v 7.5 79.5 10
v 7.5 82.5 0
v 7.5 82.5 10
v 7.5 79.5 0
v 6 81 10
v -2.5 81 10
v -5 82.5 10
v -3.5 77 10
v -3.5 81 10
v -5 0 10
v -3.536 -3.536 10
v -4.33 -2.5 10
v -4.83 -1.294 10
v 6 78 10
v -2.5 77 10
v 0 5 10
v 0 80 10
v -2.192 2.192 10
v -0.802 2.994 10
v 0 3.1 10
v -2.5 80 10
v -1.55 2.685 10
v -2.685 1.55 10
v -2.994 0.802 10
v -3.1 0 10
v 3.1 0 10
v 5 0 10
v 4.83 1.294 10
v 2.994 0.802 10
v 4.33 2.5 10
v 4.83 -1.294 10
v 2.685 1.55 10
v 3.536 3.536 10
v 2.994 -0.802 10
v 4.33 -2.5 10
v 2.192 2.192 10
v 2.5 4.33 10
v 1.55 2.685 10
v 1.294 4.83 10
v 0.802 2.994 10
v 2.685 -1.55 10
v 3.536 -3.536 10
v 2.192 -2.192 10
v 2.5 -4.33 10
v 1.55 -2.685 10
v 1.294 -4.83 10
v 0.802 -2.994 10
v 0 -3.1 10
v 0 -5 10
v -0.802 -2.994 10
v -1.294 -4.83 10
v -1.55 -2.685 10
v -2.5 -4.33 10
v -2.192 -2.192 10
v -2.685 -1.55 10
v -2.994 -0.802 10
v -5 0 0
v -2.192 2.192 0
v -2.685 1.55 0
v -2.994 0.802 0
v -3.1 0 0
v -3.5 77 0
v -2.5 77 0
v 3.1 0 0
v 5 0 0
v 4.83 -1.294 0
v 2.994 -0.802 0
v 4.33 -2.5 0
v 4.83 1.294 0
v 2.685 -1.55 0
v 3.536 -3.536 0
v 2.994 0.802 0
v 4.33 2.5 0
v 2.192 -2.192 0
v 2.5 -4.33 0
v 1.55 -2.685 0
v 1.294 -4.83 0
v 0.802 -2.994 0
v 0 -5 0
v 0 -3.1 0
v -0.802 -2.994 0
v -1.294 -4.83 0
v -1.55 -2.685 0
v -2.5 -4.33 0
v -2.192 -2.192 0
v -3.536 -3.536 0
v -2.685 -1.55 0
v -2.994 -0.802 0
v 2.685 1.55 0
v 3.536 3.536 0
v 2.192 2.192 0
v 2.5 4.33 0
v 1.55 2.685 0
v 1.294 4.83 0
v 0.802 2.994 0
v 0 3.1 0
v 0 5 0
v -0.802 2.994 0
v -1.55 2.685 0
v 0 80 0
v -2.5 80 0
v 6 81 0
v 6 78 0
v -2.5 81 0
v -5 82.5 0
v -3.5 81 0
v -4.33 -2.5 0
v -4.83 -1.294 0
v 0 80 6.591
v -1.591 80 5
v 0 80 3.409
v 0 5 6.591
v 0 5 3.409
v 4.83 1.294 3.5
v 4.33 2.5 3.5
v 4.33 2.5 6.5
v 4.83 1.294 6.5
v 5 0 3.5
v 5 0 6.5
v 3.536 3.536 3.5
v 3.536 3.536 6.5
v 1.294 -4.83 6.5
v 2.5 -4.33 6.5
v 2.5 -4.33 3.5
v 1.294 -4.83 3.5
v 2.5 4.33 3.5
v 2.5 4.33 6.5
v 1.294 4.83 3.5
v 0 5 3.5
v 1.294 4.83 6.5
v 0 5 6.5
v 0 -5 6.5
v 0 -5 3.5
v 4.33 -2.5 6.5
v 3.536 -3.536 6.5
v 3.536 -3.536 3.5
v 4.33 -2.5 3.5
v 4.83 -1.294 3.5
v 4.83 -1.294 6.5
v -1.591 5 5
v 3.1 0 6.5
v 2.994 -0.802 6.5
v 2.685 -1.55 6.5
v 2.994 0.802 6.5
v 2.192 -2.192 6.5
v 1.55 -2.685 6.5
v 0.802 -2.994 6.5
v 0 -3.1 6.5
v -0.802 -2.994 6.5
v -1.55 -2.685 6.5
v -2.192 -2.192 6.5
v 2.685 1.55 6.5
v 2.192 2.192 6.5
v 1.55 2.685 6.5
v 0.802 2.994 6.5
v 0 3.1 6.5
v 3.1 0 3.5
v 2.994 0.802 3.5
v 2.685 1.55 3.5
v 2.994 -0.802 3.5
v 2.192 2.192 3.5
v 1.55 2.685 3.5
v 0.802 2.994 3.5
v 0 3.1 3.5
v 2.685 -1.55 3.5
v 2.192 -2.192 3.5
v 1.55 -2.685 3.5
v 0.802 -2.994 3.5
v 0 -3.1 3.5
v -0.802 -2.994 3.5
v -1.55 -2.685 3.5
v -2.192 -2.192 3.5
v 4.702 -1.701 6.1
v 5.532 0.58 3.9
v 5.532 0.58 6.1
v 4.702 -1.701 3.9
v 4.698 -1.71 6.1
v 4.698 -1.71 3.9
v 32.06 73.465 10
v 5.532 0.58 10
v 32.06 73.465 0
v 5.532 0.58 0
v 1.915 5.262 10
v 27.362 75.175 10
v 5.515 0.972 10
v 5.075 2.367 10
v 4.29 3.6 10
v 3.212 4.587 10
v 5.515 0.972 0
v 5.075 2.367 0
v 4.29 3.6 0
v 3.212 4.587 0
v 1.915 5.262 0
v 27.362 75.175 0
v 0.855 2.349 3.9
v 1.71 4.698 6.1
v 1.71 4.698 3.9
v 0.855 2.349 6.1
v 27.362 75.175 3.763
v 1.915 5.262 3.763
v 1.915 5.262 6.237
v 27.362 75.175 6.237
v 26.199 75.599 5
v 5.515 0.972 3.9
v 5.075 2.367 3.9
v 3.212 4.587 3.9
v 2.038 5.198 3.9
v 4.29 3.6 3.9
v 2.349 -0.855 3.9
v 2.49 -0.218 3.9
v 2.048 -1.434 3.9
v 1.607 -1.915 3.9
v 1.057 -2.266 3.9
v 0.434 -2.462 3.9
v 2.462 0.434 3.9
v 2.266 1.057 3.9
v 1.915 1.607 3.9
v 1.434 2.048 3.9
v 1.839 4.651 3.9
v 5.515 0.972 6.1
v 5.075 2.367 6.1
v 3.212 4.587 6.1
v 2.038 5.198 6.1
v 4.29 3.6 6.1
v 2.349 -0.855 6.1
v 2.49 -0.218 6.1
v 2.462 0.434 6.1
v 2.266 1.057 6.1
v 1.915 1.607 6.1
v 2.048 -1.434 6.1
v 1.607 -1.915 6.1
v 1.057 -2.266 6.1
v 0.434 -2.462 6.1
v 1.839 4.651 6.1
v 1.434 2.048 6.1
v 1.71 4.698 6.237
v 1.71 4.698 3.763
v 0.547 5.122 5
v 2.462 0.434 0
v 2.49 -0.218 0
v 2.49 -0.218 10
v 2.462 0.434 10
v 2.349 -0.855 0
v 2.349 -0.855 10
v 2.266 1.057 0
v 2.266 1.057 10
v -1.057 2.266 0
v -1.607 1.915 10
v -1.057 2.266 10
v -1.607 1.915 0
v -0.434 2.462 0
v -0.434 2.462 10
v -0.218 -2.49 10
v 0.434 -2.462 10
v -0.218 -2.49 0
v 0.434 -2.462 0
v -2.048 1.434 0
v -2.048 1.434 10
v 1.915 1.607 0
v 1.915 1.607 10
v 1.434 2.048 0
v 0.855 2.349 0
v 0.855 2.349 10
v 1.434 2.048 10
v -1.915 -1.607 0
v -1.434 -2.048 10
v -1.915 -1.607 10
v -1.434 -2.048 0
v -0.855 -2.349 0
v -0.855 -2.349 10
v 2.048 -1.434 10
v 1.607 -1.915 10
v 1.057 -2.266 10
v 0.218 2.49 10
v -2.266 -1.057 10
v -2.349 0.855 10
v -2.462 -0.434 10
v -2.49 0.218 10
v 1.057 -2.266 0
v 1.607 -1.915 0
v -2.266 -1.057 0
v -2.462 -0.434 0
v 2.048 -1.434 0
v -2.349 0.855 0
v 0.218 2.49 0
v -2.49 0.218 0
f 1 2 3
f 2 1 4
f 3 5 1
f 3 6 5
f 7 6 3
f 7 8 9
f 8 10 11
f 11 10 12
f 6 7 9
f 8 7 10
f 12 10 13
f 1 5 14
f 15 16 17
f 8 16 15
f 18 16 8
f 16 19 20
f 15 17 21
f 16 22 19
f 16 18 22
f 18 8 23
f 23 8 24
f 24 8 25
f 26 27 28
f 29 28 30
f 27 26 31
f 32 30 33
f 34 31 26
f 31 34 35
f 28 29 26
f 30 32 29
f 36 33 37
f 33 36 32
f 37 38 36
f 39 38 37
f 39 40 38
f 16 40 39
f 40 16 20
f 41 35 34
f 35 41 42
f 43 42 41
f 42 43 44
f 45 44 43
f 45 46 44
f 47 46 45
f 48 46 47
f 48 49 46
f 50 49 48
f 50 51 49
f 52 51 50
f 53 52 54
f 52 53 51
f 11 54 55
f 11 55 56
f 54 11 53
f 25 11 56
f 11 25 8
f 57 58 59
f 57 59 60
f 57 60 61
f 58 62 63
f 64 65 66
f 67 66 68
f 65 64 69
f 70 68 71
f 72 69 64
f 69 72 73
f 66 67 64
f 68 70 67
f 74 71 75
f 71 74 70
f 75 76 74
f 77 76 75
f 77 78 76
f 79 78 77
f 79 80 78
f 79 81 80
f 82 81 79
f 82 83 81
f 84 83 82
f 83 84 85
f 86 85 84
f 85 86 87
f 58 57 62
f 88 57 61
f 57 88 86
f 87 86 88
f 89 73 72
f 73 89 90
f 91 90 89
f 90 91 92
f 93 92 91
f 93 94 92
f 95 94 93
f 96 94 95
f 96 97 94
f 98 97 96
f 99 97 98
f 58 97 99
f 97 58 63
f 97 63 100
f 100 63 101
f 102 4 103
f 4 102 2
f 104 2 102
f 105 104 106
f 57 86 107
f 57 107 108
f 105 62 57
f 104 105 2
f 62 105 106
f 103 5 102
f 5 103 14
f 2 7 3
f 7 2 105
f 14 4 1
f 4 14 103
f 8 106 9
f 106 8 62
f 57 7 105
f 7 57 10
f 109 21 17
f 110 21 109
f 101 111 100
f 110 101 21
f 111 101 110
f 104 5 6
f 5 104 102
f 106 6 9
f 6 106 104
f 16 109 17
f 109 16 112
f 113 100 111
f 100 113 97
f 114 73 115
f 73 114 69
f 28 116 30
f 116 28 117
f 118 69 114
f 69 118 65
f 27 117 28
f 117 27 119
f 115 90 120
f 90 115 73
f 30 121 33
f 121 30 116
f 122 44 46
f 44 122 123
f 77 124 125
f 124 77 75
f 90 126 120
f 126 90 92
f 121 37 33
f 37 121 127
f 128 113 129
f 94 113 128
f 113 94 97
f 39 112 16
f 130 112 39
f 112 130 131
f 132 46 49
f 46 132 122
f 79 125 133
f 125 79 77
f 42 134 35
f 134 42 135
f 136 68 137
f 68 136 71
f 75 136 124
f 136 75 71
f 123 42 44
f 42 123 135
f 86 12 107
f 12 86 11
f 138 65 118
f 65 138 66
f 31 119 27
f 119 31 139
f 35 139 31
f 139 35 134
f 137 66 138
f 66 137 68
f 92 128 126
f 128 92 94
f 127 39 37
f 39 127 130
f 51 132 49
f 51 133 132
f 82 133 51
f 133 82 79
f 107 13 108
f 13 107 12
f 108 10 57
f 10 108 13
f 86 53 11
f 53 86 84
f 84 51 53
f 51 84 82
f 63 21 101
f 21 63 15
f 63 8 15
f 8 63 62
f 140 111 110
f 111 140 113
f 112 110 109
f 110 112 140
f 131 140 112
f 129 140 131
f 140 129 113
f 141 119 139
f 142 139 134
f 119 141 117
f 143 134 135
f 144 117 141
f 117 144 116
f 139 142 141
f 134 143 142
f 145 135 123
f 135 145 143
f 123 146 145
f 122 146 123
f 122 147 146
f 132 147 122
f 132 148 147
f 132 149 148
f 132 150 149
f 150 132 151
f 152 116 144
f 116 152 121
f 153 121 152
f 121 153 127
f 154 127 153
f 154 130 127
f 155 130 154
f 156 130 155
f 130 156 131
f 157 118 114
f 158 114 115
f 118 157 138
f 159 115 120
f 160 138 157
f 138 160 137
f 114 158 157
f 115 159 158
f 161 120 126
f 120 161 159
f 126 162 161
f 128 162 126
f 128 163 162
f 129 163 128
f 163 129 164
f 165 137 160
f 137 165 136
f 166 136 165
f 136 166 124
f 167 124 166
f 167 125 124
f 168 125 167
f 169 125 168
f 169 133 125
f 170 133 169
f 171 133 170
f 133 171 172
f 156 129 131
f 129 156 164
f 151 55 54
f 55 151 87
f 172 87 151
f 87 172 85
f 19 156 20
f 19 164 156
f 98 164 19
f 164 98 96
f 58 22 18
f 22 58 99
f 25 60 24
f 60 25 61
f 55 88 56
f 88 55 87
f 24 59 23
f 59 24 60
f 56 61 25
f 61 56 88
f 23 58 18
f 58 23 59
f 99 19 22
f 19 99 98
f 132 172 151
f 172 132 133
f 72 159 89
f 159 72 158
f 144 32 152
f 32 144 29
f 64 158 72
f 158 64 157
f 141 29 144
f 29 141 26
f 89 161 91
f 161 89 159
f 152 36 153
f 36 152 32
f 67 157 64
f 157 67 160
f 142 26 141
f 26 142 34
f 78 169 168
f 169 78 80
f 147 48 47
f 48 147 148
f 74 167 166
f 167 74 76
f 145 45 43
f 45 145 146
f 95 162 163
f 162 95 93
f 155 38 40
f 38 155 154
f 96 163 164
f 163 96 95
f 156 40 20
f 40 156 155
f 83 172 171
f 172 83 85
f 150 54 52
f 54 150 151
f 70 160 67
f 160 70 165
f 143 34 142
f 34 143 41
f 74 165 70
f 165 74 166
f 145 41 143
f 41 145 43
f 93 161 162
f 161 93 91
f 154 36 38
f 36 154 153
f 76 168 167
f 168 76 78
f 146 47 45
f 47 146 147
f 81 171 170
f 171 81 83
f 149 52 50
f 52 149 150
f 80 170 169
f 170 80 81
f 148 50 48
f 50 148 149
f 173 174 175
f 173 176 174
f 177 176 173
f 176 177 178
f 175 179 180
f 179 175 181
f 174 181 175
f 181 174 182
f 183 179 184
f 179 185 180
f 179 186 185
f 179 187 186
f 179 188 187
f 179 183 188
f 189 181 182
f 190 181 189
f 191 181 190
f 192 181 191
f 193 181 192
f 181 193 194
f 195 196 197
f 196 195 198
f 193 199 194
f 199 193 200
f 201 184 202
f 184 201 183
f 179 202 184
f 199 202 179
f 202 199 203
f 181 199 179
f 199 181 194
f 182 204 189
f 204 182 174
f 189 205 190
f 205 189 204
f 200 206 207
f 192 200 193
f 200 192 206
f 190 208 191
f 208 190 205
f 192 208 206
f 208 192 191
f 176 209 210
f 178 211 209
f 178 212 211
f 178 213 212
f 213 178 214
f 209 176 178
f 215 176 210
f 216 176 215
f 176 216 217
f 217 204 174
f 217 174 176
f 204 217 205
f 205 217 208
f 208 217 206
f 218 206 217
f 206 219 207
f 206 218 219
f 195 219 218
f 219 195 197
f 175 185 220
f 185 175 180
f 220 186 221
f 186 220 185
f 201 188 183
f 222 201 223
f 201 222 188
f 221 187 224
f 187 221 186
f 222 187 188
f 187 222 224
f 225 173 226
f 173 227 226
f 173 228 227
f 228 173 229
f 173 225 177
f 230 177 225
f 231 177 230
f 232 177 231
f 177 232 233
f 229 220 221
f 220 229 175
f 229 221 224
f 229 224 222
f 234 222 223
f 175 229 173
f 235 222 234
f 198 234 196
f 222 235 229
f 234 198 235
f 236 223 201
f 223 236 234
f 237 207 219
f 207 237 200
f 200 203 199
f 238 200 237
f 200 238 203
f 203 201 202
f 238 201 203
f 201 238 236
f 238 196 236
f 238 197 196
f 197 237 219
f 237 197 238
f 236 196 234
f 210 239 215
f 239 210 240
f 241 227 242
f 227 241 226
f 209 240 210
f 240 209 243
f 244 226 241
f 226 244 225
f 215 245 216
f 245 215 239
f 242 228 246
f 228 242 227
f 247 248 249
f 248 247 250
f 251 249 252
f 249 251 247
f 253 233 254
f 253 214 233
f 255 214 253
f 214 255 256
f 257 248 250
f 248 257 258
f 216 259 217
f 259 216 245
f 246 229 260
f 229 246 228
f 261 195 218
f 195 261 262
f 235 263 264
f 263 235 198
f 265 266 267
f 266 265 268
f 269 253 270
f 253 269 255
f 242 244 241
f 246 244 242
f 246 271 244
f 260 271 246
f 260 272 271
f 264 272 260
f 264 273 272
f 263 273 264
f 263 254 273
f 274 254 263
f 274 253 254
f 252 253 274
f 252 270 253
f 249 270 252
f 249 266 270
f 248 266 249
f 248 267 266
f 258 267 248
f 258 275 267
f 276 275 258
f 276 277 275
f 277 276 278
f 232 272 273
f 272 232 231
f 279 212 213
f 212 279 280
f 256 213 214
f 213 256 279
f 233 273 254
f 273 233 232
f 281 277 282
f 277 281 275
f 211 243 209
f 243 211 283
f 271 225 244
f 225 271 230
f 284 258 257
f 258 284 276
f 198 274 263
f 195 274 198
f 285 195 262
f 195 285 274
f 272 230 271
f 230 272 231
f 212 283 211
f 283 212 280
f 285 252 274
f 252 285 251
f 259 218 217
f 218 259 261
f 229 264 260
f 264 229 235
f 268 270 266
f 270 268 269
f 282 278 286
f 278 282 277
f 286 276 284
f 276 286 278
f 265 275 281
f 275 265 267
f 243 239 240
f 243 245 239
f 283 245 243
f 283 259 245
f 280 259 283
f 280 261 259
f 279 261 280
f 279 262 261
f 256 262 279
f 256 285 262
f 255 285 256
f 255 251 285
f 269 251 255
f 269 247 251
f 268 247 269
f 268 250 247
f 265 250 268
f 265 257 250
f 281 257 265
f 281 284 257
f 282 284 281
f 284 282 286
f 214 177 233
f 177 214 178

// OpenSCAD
/* https://www.thingiverse.com/thing:2165264 */

// The diameter of the hinge
axis_diameter = 5.0;
// The gap left around the hinge (subtracted from the diameter)
axis_margin = 0.6;
// Z-wise separation near parts
axis_margin_z = 0.4;

// The length of the arms (from hinge center)
arm_length = 80.0;
// The height of the arms
arm_height = 10.0;
// The width/thickness of one arm
arm_width  =  5.0;

// The size of the hinge attached to the second arm
mount_height = 3.0;

// Size of the channel/potrusion in the arms, 0 to disable
channel_d = 2;

// Length of the locking hook
hook_tooth_length = 4.5;

/* [Hidden] */

hook_margin = 1.0;
hook_thickness = 1.5;
hook_trim_length = 3.0;

_cyl_fn = 24;

base_arm();
color("red") rotate(-20) second_arm();

module base_arm() {
    difference() {
        union() {
            // Main arm
            translate([-arm_width, 0])
                    cube([arm_width, arm_length, arm_height]);
            // Hinge outer
            cylinder(r=arm_width, h=arm_height, $fn=_cyl_fn);
            
            // Hook
            translate([-arm_width, arm_length, 0]) {
                cube([hook_thickness, hook_thickness+hook_margin, arm_height]);
                translate([0, hook_margin, 0])
                    cube([arm_width*2+hook_margin, hook_thickness, arm_height]);
                translate([arm_width*2+hook_margin, -hook_tooth_length+hook_margin+hook_thickness, 0])
                    difference() {
                        cube([hook_thickness, hook_tooth_length, arm_height]);
                        translate([0,0,-1]) rotate(-45)
                            cube([hook_thickness*1.5, hook_thickness*1.5, arm_height+2]);
                    }
            }
        }
        // Hook trim
        translate([-arm_width+hook_thickness, arm_length-hook_trim_length, -1])
            cube([hook_margin, hook_trim_length+hook_margin, arm_height+2]);
        
        channel(0.25);
        
        // Remove slot for arm to rotate in
        translate([0,-arm_width, (arm_height-mount_height)/2])
            cube([arm_width, arm_width*2, mount_height]);
        
        c_h = (arm_height - mount_height) / 2;
        // Trim slot a bit more
        translate([0, 0, c_h])  hull() {
            cylinder(d=axis_diameter+axis_margin*2, h=mount_height, $fn=_cyl_fn);
            translate([0, -arm_width, 0]) cube([0.01, arm_width, mount_height]);
        }
        
        // Big center hole
        translate([0,0,-1]) cylinder(d=axis_diameter+axis_margin*2, h=arm_height+2, $fn=_cyl_fn);
    }
}


module channel(delta=0) {
    if (channel_d > 0) {
        translate([0,arm_length/2+axis_diameter/2, arm_height/2]) rotate([0, 45, 0])
            cube([channel_d+delta, arm_length-axis_diameter, channel_d+delta], center=true);
    }
}

module second_arm() {
    c_h = (arm_height - mount_height) / 2 + axis_margin_z;
    difference() {
        translate([0, 0])
            cube([arm_width, arm_length, arm_height]);
        
        // Remove lower piece
        translate([0, 0, -1])
            cylinder(r=arm_width+axis_margin, h=c_h+1, $fn=_cyl_fn);
        // Remove upper piece
        translate([0, 0, arm_height-c_h])
            cylinder(r=arm_width+axis_margin, h=c_h+1, $fn=_cyl_fn);
    
    }
    // Potrusion
    channel(-0.25);
    
    // Center cylinder
    cylinder(d=axis_diameter, h=arm_height, $fn=_cyl_fn);
    
    // Attach to arm
    translate([0, 0, c_h])  hull() {
        cylinder(d=axis_diameter, h=arm_height-c_h*2, $fn=_cyl_fn);
        cube([arm_width, 0.01, arm_height-c_h*2]);
    }
}
